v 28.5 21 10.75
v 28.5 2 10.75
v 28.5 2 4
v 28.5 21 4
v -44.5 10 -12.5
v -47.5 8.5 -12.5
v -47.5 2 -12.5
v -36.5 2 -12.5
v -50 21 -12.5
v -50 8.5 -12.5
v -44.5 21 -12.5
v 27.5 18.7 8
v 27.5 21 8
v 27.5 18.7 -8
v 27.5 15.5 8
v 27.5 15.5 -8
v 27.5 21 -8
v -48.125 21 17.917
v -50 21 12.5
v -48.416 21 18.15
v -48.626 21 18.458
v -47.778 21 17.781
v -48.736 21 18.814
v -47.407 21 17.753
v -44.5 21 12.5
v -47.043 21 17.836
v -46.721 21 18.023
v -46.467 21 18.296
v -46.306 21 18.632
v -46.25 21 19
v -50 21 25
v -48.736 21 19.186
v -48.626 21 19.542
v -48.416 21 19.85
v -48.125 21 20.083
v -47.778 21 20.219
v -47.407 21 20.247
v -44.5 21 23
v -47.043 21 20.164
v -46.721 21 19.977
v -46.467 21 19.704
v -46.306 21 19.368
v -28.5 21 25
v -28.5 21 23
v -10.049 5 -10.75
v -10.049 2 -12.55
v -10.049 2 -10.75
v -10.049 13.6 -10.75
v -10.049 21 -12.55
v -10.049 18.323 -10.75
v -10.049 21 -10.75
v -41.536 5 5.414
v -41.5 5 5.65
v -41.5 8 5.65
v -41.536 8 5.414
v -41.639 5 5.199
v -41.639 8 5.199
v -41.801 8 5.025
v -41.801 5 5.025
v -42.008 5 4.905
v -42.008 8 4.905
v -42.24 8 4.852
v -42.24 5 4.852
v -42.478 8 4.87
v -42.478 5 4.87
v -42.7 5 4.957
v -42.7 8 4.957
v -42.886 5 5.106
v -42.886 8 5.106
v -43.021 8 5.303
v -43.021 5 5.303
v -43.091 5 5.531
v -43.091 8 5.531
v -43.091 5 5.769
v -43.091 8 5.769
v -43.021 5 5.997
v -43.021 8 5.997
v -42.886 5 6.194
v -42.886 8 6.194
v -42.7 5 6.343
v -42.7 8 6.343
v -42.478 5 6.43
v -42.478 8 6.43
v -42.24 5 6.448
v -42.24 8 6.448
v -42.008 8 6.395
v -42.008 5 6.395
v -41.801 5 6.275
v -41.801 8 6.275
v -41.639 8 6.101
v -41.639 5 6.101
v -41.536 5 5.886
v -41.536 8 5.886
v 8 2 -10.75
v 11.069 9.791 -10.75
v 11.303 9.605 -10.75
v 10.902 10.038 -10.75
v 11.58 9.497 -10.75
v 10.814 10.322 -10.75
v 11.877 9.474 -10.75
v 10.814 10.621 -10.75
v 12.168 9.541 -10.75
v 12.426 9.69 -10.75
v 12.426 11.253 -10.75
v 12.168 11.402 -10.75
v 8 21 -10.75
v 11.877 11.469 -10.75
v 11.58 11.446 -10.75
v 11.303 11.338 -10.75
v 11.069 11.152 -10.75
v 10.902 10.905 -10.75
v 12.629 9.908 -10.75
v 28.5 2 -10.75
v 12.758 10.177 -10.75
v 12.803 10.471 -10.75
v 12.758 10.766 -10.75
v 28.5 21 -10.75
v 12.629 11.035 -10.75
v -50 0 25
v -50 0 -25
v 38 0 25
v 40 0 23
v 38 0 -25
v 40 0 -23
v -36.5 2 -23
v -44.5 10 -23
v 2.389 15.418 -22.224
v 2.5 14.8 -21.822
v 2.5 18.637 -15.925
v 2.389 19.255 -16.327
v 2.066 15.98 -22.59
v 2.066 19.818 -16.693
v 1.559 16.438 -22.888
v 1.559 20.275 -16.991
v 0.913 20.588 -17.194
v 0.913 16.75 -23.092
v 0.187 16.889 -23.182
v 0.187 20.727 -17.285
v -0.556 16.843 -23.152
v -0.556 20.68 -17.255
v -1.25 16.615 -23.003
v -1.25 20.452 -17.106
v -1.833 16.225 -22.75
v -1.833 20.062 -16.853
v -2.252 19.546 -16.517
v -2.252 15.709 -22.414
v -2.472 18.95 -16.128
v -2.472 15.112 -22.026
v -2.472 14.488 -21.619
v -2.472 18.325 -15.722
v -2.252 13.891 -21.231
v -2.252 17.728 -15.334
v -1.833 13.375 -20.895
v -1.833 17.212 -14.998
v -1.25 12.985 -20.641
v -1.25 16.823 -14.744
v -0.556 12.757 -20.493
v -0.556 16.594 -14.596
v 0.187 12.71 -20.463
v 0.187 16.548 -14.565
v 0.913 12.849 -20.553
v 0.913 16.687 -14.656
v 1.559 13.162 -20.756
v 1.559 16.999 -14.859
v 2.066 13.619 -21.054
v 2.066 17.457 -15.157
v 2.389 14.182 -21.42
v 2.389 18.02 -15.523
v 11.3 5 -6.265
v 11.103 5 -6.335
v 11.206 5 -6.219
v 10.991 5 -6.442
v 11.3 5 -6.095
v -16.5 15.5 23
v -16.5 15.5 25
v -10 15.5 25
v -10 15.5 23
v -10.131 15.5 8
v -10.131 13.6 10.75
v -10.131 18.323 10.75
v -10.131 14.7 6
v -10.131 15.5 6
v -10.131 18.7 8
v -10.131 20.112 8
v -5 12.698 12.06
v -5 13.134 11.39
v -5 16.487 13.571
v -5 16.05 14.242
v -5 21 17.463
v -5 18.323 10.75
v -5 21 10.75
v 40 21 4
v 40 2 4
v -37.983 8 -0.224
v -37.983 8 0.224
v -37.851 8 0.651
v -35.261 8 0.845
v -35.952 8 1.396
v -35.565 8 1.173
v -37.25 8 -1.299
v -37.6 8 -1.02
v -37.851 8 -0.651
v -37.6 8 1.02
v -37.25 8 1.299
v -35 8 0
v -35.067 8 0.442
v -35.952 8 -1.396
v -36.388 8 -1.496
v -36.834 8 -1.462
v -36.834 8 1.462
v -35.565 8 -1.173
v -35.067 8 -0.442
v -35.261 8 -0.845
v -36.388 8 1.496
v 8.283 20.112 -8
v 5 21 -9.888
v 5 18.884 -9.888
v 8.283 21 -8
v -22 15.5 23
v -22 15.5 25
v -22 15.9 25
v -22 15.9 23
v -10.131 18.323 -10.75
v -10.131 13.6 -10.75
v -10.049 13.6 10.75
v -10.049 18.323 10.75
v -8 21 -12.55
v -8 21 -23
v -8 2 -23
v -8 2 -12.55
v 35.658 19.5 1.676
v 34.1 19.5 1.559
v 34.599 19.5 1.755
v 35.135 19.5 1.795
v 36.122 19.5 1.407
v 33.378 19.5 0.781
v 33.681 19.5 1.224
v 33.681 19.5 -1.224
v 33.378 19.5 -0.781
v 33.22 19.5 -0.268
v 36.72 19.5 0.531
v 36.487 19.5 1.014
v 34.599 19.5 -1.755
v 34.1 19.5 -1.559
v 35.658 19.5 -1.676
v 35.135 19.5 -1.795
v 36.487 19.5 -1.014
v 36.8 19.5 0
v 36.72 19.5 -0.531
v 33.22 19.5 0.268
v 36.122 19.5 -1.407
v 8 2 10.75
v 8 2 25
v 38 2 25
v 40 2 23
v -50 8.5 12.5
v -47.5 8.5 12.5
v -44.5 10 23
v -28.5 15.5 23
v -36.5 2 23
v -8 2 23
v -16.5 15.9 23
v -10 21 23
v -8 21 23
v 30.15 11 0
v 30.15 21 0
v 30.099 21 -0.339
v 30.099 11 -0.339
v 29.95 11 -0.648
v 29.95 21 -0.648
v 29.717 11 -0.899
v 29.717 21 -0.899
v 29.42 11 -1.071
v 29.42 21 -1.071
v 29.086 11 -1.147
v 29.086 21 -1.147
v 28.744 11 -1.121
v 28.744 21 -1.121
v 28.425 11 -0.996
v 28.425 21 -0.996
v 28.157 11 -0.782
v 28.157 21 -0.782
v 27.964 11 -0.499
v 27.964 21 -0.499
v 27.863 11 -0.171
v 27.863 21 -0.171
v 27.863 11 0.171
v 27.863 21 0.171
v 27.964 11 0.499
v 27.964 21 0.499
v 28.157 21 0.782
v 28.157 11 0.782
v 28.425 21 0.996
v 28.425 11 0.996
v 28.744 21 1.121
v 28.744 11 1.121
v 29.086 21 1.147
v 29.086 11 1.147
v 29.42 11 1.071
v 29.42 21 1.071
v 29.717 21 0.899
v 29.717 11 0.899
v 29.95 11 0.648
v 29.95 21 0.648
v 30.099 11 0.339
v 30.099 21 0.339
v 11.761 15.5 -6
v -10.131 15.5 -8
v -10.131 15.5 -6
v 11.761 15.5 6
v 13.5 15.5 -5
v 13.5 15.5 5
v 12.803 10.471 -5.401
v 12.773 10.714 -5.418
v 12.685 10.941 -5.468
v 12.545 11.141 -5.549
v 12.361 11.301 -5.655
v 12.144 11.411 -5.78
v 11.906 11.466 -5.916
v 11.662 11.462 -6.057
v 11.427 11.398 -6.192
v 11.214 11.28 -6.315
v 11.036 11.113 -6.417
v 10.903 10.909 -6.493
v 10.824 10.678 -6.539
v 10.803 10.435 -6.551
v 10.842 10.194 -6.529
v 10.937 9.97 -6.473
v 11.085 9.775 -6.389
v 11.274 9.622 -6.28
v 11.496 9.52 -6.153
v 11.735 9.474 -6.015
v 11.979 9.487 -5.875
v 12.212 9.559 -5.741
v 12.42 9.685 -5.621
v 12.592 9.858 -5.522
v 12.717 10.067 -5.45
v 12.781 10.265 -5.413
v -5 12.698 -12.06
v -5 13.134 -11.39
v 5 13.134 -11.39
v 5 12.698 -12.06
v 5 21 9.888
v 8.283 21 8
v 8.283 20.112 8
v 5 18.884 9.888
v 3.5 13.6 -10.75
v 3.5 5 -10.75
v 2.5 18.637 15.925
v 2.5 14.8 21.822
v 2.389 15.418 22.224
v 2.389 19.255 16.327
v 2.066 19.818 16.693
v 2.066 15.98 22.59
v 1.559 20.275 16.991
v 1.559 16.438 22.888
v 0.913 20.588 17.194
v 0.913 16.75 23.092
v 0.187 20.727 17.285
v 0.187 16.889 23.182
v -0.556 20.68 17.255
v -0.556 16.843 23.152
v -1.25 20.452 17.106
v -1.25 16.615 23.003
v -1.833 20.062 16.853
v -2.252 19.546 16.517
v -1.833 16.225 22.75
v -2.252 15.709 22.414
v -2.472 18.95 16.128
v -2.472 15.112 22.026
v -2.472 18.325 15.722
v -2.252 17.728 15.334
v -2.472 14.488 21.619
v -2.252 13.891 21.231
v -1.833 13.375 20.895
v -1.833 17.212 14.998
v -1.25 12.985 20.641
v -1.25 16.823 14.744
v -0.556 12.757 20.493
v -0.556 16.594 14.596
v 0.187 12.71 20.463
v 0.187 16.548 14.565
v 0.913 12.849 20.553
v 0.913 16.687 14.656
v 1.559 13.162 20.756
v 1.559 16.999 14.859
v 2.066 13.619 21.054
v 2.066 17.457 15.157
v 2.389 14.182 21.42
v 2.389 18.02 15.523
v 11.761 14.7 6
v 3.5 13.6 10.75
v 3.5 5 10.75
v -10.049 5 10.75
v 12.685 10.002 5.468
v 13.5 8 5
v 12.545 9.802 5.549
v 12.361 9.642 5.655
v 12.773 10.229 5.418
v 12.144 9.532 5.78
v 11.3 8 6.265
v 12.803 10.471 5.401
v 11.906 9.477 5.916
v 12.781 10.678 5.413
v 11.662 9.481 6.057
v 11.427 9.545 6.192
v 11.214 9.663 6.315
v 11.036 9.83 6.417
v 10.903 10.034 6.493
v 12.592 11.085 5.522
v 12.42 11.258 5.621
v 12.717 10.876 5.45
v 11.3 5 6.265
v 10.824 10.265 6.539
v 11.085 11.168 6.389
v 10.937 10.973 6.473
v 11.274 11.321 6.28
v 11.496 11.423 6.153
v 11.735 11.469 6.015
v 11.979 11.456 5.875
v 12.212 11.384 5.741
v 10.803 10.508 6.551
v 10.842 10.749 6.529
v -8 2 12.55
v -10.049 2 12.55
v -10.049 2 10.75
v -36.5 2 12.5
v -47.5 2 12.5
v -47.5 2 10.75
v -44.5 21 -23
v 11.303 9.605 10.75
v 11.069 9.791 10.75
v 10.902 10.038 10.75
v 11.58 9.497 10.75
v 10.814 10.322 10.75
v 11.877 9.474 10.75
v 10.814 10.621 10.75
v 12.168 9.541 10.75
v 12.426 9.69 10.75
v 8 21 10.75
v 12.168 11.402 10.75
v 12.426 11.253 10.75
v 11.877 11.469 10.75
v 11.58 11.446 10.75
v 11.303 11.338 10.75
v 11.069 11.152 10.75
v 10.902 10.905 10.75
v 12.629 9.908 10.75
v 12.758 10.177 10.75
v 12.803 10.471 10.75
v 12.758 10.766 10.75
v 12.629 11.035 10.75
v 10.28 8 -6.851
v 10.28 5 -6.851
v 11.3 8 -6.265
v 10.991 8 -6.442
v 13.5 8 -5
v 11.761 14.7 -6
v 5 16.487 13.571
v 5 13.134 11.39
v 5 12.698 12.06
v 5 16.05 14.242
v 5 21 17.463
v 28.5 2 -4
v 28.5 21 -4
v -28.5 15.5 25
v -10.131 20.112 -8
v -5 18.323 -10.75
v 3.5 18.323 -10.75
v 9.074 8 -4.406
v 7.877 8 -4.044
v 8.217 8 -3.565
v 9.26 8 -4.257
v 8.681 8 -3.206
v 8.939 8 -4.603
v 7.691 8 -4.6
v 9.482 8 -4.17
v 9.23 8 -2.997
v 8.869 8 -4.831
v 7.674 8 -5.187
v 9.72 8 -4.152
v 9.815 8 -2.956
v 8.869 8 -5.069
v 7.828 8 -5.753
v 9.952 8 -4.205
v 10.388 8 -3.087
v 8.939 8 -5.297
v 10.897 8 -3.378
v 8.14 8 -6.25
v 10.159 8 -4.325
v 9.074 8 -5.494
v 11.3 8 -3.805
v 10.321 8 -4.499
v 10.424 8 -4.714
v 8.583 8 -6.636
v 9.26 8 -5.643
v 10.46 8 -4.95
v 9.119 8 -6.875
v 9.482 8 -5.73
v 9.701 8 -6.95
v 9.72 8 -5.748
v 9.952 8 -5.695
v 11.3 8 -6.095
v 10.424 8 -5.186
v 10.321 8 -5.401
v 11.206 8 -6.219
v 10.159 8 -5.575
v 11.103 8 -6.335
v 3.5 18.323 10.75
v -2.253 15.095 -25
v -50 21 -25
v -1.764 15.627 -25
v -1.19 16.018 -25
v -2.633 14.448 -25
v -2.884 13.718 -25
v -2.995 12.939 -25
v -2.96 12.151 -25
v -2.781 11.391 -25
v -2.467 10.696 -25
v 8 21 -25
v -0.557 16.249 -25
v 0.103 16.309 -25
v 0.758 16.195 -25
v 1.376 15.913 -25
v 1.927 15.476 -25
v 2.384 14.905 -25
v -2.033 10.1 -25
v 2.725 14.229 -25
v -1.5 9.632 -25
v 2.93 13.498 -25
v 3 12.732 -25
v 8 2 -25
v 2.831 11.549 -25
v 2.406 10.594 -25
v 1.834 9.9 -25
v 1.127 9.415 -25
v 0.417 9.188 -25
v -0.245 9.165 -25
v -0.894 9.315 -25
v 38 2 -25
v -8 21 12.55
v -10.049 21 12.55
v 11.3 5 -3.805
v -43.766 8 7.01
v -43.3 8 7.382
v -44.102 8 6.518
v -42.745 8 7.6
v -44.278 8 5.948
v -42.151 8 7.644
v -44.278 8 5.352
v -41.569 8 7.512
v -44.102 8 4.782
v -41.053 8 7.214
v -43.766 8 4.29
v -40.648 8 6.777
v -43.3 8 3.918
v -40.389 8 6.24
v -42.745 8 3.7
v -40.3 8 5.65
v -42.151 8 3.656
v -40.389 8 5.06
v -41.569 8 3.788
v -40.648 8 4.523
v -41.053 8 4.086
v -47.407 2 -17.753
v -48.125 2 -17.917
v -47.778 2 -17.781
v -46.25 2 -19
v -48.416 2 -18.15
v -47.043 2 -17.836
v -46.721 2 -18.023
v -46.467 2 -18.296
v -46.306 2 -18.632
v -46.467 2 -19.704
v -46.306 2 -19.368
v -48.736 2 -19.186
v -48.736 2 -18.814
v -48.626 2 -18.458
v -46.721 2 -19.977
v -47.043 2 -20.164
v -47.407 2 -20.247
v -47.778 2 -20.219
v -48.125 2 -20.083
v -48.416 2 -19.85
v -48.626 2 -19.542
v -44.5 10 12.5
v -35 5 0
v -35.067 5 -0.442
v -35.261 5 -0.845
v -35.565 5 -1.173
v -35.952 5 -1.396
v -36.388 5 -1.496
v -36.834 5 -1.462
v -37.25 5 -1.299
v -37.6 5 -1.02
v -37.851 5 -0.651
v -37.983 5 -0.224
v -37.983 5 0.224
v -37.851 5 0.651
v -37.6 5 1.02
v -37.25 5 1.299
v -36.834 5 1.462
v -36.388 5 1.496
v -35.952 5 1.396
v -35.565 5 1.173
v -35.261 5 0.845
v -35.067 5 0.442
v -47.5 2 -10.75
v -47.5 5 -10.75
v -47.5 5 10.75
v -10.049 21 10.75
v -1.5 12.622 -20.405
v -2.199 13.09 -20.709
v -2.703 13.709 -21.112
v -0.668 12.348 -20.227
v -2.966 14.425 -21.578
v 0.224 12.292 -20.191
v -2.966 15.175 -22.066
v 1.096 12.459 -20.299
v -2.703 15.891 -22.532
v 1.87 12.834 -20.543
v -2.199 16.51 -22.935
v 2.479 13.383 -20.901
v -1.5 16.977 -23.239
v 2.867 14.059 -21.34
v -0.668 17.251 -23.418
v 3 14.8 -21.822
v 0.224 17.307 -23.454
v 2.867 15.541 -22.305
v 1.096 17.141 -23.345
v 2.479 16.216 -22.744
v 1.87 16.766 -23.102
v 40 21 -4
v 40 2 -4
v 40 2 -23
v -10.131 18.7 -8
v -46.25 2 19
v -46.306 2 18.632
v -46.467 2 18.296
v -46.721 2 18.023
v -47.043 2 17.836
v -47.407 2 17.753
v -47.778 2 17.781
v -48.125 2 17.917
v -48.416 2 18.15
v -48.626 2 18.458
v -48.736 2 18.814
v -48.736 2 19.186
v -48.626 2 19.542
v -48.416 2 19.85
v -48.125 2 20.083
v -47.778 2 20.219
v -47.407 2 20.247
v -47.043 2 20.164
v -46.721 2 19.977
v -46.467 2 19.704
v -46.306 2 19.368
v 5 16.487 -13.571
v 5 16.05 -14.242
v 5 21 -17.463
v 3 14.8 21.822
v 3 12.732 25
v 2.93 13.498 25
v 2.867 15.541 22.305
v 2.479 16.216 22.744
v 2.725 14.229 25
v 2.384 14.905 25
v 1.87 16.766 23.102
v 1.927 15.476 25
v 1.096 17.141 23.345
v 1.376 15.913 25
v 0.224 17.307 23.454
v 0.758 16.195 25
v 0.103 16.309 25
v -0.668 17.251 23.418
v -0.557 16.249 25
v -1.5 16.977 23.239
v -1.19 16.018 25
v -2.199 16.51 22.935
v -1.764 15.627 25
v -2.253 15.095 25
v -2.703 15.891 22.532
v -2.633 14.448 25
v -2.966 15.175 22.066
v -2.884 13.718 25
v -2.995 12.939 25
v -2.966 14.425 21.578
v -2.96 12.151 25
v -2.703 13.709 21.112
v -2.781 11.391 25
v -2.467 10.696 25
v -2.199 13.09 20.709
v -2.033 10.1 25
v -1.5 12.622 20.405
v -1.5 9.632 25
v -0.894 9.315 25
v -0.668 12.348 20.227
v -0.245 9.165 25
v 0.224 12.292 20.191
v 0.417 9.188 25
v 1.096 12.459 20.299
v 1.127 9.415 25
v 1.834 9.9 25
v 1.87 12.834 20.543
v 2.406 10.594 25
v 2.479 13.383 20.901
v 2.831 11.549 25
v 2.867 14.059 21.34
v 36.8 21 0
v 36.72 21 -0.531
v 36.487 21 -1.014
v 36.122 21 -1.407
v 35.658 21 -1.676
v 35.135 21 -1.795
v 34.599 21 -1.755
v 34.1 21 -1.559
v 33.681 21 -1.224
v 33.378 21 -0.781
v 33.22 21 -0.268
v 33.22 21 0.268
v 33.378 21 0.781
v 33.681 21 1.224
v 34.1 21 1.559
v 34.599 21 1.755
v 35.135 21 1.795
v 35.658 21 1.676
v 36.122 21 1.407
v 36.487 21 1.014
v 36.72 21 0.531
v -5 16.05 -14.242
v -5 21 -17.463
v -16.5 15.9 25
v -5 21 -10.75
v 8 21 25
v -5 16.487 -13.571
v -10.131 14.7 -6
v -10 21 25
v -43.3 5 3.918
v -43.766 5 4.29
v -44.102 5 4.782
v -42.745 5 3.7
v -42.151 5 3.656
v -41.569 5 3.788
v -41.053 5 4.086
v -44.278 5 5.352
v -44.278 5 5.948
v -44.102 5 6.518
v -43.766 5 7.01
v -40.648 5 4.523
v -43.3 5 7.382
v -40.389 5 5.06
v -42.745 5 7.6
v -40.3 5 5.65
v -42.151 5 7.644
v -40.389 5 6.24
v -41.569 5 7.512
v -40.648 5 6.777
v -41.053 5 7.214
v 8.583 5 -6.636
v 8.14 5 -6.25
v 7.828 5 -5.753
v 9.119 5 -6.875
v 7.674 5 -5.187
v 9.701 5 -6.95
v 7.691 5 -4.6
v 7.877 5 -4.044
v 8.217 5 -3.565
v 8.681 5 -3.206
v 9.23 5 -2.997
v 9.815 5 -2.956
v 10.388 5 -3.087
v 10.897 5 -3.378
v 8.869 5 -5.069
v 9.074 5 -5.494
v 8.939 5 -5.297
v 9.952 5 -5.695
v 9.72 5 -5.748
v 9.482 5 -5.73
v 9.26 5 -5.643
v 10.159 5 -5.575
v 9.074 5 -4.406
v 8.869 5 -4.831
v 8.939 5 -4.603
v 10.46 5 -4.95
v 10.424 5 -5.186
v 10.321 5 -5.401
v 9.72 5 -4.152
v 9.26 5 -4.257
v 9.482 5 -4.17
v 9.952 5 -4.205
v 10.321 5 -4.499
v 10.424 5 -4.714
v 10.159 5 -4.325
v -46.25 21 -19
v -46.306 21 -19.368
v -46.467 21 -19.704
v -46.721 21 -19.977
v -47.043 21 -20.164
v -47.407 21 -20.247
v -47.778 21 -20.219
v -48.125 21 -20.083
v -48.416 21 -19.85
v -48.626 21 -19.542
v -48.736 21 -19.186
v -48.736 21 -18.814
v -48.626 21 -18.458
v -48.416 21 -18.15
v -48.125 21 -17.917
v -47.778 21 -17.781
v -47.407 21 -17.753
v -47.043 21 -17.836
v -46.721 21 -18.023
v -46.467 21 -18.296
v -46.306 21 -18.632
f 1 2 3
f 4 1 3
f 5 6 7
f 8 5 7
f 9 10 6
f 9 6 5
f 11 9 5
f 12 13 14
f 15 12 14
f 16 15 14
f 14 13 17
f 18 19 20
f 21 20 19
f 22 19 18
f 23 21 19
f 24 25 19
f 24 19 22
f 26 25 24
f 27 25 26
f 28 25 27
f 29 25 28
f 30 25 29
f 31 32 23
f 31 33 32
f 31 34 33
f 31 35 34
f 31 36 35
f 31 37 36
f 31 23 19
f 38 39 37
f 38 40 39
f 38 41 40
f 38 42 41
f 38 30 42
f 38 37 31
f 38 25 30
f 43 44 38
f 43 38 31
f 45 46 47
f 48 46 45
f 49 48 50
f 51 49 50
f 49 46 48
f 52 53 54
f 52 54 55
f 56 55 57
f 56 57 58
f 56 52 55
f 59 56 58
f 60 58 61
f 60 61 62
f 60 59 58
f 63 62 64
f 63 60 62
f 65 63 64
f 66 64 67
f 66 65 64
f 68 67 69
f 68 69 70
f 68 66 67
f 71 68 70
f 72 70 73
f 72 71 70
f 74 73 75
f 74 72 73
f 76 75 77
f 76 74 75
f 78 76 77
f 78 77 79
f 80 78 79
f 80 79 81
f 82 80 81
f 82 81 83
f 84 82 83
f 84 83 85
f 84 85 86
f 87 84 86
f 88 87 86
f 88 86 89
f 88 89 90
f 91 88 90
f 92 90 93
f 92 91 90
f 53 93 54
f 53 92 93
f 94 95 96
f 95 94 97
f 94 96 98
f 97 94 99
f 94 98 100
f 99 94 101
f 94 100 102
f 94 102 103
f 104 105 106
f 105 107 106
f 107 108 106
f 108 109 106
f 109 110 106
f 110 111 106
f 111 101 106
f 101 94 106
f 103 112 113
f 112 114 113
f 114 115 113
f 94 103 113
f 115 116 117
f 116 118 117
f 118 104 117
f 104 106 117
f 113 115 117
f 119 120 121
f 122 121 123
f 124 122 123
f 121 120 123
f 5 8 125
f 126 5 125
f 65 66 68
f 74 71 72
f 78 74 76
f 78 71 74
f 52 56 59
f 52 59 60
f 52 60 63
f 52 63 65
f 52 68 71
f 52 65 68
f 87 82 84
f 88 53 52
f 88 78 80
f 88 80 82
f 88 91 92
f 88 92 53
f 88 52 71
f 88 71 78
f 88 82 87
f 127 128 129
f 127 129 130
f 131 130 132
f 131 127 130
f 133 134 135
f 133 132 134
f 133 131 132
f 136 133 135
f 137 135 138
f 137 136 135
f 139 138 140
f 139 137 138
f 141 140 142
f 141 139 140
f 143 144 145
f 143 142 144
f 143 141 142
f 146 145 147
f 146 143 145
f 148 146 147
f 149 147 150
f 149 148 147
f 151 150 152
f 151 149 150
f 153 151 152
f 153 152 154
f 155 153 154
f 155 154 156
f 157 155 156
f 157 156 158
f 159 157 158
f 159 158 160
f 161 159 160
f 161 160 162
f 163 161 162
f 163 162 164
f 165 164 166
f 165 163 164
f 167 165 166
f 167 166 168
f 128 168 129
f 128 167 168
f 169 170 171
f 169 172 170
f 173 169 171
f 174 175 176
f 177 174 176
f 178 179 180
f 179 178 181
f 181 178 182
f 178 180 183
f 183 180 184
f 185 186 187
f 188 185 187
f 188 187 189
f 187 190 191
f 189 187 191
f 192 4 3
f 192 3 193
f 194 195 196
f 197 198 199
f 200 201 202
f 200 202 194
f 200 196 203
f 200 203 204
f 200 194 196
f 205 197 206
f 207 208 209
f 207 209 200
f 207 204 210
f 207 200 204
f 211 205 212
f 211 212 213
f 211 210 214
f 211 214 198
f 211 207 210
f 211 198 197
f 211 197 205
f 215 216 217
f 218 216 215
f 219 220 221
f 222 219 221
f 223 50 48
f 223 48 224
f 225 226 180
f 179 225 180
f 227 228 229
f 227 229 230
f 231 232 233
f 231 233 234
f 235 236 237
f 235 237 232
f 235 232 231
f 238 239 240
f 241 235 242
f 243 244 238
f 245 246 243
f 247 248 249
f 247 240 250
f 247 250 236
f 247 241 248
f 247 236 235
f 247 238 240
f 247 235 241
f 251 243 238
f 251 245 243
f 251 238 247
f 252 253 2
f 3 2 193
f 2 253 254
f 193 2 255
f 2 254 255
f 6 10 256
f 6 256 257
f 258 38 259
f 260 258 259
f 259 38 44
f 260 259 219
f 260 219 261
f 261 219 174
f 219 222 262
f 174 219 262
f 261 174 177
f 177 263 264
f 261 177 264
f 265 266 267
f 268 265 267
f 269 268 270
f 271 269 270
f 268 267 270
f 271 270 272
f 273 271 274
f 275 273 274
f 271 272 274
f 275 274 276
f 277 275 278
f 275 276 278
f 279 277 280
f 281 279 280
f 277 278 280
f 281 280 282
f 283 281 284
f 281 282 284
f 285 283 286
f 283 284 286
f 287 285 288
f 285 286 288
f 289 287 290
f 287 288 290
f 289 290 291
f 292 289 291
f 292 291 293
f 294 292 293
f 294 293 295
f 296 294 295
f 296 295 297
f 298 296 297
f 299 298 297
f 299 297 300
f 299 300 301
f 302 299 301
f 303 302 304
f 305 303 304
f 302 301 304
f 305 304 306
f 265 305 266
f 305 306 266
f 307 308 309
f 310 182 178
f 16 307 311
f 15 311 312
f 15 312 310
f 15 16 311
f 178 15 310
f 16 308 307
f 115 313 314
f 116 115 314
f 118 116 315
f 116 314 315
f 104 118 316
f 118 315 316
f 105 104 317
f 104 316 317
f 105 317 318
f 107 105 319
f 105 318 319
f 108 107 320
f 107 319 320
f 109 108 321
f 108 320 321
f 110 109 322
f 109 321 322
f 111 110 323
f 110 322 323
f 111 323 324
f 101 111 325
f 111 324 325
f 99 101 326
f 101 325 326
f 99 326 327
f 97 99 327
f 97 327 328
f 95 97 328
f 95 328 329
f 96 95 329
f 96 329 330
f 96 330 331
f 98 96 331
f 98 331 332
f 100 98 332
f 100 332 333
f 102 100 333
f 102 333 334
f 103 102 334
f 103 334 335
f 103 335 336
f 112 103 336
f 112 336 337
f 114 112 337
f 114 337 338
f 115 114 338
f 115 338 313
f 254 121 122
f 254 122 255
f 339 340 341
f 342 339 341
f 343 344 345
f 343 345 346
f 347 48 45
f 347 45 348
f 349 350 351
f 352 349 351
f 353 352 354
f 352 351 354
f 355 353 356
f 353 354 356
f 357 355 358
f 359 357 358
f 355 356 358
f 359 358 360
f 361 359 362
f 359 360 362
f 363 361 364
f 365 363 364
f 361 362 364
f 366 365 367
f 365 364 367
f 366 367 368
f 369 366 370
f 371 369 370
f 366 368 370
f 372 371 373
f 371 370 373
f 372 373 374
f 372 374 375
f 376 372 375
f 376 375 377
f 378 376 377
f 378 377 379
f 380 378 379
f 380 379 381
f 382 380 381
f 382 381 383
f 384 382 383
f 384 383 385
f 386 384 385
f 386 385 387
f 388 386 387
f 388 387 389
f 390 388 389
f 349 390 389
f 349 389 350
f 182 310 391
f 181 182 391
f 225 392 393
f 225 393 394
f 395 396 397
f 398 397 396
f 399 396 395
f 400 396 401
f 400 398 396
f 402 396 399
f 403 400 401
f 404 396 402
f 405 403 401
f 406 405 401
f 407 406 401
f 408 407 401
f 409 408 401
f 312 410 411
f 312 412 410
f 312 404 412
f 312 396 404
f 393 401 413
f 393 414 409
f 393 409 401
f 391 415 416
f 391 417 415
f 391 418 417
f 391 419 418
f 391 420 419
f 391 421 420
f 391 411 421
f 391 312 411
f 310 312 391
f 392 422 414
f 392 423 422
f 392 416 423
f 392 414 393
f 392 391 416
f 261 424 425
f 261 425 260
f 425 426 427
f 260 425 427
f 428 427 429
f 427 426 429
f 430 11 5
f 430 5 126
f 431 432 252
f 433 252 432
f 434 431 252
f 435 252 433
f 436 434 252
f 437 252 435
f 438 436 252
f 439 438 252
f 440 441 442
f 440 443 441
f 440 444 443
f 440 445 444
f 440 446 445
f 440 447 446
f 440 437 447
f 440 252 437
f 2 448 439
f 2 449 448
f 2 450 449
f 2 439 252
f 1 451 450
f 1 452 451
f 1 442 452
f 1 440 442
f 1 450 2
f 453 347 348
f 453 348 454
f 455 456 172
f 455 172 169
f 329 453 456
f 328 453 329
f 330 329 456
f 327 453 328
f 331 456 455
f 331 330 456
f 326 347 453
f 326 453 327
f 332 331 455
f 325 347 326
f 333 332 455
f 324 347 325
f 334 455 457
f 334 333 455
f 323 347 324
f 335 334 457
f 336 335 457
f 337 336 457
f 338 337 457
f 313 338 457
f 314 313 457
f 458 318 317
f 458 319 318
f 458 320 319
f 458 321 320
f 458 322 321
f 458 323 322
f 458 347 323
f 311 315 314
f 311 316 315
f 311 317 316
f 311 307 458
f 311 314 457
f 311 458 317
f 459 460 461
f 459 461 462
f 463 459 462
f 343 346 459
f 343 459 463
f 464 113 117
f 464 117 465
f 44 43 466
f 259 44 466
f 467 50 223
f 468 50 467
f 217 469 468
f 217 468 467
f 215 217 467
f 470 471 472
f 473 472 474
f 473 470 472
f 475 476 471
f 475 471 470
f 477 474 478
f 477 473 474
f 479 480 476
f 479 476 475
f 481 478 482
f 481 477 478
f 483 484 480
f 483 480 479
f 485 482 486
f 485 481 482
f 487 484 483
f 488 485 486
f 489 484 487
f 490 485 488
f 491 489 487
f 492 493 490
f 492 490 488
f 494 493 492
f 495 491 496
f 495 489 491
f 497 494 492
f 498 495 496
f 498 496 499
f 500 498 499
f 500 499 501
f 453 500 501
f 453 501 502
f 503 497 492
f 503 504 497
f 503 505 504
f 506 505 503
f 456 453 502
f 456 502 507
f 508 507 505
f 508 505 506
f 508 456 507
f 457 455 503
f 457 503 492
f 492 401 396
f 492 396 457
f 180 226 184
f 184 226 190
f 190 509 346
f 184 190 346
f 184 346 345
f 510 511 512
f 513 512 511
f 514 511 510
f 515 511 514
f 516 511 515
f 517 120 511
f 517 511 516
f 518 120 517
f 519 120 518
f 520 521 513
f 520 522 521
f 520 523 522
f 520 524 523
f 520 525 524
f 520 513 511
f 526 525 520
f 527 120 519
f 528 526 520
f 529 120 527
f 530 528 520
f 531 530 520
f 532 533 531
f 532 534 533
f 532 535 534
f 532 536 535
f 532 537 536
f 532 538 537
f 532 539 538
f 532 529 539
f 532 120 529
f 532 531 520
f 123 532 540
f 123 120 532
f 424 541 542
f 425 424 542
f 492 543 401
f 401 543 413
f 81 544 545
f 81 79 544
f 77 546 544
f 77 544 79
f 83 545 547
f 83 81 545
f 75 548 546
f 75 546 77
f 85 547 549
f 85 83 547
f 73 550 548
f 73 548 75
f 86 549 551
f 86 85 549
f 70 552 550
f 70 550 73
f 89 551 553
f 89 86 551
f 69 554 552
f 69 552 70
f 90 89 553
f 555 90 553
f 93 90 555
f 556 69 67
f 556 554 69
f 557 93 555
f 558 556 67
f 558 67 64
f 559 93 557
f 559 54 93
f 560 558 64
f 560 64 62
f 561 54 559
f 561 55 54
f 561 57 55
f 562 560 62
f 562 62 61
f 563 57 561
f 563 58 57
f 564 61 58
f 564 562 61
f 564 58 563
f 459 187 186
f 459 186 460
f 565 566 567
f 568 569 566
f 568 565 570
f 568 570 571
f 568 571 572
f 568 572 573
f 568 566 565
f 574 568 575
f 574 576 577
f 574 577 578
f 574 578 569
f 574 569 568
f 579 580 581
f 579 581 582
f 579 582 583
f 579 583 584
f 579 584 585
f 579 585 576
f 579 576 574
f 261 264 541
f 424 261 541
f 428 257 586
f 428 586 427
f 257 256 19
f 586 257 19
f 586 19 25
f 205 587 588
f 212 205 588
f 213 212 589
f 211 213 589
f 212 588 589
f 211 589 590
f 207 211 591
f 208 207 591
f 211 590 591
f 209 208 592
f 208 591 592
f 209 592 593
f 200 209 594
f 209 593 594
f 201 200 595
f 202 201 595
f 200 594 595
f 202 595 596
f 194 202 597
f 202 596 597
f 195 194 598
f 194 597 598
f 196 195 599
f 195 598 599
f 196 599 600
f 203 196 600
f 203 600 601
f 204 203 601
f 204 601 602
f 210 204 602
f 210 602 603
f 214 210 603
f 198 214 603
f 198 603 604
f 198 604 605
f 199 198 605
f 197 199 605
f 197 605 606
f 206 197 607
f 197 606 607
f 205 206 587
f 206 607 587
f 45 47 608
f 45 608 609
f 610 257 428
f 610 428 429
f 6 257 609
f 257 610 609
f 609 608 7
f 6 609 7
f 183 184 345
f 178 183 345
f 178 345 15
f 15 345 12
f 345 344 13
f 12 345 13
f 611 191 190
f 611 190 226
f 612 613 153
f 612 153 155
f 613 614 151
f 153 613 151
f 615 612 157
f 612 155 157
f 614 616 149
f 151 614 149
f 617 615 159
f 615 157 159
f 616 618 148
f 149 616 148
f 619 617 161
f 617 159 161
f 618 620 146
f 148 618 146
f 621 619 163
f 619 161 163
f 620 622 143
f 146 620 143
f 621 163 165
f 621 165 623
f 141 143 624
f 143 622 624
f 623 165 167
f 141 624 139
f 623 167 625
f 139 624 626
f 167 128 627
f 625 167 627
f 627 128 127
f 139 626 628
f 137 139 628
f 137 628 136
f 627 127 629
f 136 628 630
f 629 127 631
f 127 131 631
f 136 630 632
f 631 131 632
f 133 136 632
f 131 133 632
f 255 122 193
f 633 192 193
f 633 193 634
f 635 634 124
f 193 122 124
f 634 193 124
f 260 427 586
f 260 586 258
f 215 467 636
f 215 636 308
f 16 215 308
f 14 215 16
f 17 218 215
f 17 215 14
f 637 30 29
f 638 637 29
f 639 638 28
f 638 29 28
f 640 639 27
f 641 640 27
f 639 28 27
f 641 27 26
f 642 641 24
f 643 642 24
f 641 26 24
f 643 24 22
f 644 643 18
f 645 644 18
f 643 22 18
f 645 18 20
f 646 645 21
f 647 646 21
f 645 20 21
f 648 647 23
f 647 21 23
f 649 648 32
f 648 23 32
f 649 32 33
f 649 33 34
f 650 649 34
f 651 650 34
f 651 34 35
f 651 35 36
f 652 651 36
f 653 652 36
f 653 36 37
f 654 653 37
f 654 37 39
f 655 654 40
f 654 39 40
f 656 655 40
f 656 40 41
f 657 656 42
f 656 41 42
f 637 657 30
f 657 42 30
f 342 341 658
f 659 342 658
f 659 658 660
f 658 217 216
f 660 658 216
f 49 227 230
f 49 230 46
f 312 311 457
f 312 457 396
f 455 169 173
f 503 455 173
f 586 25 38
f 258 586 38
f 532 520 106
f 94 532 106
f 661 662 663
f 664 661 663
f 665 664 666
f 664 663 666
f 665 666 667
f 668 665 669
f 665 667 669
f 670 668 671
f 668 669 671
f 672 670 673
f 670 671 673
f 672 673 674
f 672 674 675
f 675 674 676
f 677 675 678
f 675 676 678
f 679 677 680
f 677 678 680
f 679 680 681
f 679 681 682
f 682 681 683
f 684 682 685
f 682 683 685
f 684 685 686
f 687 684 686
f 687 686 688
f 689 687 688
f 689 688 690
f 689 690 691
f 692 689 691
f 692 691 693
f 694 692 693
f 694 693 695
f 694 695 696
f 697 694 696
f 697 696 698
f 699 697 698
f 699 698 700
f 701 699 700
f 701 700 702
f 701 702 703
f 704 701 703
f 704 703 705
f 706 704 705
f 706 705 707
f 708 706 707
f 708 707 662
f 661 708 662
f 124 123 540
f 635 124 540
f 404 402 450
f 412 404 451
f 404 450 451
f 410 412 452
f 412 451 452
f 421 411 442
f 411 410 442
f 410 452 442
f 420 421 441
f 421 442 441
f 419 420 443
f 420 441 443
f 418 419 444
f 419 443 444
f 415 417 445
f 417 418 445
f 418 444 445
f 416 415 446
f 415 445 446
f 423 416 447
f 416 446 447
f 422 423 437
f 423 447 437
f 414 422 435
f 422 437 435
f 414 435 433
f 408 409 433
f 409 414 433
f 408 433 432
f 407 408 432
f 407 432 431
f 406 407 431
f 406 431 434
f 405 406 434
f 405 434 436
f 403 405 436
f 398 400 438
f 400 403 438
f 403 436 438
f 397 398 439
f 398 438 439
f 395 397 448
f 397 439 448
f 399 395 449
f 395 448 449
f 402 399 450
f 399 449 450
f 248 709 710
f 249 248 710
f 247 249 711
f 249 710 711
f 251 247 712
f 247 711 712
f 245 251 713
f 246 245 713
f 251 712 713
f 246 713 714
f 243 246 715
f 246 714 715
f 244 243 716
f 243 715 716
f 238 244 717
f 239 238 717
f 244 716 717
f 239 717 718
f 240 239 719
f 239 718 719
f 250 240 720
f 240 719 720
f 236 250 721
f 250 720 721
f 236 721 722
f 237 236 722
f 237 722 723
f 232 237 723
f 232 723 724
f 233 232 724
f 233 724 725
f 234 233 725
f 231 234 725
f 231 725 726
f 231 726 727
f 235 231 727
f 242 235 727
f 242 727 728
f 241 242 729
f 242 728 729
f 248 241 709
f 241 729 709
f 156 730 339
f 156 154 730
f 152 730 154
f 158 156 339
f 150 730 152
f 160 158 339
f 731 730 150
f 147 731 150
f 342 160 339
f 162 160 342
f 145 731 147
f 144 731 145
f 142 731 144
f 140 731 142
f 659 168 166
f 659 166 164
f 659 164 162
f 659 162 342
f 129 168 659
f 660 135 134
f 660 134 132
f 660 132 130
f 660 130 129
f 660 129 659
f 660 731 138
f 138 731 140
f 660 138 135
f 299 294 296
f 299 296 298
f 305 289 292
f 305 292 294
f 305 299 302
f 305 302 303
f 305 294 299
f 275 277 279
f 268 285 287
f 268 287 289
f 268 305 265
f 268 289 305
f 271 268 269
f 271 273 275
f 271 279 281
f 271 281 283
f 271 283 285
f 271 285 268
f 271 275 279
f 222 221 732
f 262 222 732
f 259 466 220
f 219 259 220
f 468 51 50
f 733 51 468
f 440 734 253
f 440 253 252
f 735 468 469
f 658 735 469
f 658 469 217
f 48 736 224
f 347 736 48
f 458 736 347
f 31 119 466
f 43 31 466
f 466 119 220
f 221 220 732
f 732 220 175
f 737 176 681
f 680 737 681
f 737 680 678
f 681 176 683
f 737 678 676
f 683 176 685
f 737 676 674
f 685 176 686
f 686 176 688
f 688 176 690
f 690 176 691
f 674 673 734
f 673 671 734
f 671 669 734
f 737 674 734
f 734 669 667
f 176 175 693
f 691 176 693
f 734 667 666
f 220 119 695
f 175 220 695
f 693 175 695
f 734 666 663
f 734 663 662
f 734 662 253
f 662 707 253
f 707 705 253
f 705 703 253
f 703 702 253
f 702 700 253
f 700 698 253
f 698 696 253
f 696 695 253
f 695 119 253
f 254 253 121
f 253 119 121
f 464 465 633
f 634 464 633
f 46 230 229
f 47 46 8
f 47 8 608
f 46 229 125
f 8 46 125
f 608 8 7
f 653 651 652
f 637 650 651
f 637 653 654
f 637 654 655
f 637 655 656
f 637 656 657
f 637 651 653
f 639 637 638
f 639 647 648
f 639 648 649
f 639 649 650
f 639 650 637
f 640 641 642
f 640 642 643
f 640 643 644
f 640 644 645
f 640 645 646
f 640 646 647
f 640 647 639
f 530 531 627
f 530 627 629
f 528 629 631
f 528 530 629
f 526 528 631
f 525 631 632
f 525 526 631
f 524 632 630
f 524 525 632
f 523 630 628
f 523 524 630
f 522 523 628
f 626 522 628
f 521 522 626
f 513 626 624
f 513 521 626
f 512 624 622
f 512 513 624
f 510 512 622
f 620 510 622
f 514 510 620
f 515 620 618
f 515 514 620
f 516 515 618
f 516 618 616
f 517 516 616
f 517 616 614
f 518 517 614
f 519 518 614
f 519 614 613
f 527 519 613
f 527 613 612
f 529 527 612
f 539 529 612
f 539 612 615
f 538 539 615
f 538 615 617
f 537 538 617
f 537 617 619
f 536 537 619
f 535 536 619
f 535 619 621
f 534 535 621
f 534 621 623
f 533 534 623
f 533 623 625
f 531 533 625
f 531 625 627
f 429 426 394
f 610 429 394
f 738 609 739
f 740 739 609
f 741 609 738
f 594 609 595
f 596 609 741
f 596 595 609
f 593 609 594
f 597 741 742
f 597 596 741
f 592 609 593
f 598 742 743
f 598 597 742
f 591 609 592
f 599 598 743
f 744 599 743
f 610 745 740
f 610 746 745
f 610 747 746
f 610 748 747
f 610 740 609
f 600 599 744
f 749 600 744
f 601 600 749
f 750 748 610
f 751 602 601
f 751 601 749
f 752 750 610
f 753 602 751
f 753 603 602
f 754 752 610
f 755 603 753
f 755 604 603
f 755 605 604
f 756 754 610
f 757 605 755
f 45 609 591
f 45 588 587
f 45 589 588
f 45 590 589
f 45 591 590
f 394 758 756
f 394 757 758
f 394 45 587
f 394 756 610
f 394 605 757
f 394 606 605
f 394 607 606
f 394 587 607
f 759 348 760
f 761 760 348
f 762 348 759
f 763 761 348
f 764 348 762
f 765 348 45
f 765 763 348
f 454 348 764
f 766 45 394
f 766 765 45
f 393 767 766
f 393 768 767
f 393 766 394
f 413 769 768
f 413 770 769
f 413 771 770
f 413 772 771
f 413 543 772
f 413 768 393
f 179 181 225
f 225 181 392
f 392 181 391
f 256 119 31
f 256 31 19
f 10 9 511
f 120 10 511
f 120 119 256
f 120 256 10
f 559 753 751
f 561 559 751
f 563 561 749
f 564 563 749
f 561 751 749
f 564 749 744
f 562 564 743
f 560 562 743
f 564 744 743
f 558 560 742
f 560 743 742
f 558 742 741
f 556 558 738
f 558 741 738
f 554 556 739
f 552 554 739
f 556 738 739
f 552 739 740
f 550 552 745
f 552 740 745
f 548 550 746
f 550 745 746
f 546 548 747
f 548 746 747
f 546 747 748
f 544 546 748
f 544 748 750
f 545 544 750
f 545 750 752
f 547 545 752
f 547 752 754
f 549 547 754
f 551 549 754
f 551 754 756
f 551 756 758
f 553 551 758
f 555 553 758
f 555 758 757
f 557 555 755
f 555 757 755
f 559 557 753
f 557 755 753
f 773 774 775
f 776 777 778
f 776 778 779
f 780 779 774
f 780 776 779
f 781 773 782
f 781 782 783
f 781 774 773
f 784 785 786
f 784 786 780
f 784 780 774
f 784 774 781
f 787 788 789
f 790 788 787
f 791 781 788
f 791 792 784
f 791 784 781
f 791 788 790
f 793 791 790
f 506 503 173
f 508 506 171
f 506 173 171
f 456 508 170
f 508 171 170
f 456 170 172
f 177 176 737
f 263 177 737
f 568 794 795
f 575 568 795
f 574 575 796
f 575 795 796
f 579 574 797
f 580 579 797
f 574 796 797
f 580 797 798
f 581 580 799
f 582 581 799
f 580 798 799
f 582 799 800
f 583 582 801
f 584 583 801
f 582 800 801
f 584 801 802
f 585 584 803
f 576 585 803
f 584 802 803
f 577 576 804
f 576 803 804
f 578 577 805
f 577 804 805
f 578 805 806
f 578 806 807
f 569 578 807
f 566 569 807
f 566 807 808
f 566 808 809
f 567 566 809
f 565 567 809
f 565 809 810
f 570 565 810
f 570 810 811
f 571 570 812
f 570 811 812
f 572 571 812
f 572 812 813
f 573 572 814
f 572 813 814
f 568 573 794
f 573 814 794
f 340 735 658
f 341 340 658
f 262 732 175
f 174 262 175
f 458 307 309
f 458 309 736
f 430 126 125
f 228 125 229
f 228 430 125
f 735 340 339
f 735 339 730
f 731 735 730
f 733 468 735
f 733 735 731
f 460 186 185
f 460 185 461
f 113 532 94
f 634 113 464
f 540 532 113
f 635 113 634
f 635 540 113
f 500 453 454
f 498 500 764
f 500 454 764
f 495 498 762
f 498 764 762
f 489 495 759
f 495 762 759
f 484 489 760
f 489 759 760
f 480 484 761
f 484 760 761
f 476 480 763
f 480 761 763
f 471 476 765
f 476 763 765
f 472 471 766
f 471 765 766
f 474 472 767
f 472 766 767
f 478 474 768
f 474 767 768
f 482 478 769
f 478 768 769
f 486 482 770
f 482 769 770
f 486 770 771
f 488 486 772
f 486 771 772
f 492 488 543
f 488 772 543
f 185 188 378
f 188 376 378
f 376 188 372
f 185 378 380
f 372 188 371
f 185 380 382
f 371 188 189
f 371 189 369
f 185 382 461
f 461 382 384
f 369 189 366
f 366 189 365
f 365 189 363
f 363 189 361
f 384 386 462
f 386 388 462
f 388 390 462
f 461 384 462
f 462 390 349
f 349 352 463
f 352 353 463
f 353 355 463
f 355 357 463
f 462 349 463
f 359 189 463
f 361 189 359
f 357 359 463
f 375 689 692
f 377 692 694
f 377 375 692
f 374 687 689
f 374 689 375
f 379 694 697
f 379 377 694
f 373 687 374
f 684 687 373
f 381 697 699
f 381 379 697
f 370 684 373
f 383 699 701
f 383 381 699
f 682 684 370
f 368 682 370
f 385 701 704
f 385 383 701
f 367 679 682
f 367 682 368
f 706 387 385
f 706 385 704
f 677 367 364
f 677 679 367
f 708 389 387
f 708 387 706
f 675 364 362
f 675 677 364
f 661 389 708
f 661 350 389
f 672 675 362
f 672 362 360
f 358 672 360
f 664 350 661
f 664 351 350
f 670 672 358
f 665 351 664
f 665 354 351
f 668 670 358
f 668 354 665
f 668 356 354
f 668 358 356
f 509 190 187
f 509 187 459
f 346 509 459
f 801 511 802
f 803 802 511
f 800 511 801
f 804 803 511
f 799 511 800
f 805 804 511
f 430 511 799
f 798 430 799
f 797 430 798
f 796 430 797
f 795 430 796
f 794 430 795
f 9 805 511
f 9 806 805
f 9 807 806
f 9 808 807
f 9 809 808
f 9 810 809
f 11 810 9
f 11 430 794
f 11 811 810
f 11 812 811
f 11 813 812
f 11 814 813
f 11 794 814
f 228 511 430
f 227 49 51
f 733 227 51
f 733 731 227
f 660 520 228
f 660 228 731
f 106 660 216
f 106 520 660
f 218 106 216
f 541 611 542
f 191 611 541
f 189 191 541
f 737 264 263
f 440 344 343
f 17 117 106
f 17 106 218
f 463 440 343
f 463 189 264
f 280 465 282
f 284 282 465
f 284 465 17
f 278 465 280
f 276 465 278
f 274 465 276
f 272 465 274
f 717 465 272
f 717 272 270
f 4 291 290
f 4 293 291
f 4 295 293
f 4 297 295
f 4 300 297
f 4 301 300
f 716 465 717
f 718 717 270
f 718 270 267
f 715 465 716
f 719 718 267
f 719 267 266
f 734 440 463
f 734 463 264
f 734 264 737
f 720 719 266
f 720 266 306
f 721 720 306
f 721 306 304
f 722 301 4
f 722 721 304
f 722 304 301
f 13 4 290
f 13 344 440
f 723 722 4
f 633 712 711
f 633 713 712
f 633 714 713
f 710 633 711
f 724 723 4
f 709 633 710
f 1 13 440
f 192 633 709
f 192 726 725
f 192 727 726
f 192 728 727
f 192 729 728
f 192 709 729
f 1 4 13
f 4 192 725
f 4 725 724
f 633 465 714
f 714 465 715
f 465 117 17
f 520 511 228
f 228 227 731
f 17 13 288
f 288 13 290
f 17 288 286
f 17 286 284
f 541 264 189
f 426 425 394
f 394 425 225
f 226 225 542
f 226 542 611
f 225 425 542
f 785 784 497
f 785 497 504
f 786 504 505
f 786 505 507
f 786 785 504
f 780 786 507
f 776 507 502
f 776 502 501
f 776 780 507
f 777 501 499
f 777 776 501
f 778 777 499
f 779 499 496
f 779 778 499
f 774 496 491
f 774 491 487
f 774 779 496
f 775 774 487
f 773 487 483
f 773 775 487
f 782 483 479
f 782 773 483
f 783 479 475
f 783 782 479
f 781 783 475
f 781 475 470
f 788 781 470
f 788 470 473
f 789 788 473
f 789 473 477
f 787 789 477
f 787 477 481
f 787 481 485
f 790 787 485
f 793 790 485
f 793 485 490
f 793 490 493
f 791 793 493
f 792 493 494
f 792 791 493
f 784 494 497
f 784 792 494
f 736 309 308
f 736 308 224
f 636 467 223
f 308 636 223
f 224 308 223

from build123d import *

# Parameters (mm, degrees)
SKETCH1_W           = 90
SKETCH1_H           = 50
BOSS_EXTRUDE1_DEPTH = 21
CUT_EXTRUDE1_DEPTH  = 16
SKETCH4_R           = 2.5
CUT_EXTRUDE2_DEPTH  = 63.626624678
SKETCH5_W           = 10
SKETCH5_H           = 6.2
CUT_EXTRUDE3_DEPTH  = 19
SKETCH6_R           = 3
CUT_EXTRUDE4_DEPTH  = 20
SKETCH11_R          = 1.5
BOSS_EXTRUDE3_DEPTH = 3
BOSS_EXTRUDE2_DEPTH = 23.630686795
CUT_EXTRUDE6_DEPTH  = 19
SKETCH17_W          = 16
SKETCH17_H          = 3.2
CUT_EXTRUDE10_DEPTH = 37.549476
SKETCH15_R          = 1.8
CUT_EXTRUDE8_DEPTH  = 1.5
SKETCH16_R          = 1.25
CUT_EXTRUDE9_DEPTH  = 19
CUT_EXTRUDE11_REACH = 23
SKETCH19_R          = 4
CHAMFER1_SIZE       = 8
CHAMFER2_SIZE       = 2
CUT_EXTRUDE12_REACH = 52
SKETCH21_W          = 21.5
SKETCH21_H          = 3
BOSS_EXTRUDE4_DEPTH = 5.5
CUT_EXTRUDE13_REACH = 23
SKETCH23_W          = 37.630686795
SKETCH23_H          = 16
SKETCH25_R          = 1.15
CUT_EXTRUDE14_DEPTH = 10
SKETCH26_R          = 1
CUT_EXTRUDE15_DEPTH = 36.75
SKETCH27_W          = 2.5
SKETCH27_H          = 25
BOSS_EXTRUDE6_DEPTH = 6.5
SKETCH28_W          = 10
SKETCH28_H          = 0.8
CUT_EXTRUDE16_DEPTH = 4
SKETCH22_R          = 2
SKETCH22_R_2        = 0.8
BOSS_EXTRUDE7_DEPTH = 3


with BuildPart() as part:
    # Sketch1 → Boss-Extrude1 (new body)
    with BuildSketch(Plane(origin=(0, 0, 0), x_dir=(1, 0, 0), z_dir=(0, 1, 0))):
        with Locations((-5, 0)):
            Rectangle(SKETCH1_W, SKETCH1_H)
    extrude(amount=BOSS_EXTRUDE1_DEPTH)

    # Sketch2 → Cut-Extrude1 (cut)
    with BuildSketch(Plane(origin=(0, 21, 0), x_dir=(1, 0, 0), z_dir=(0, 1, 0))):
        Polygon((-44.5, 10.75), (3.5, 10.75), (13.5, 5), (13.5, -5), (3.5, -10.75), (-44.5, -10.75), align=None)
    extrude(amount=-CUT_EXTRUDE1_DEPTH, mode=Mode.SUBTRACT)

    # Sketch4 → Cut-Extrude2 (cut, through all)
    with BuildSketch(Plane(origin=(0, 3.891653574, -38.585684316), x_dir=(1, 0, 0), z_dir=(0, 0.545410535, 0.838169045))):
        Circle(SKETCH4_R)
    cut_extrude2 = extrude(amount=CUT_EXTRUDE2_DEPTH, mode=Mode.SUBTRACT)

    # Sketch5 → Cut-Extrude3 (cut)
    with BuildSketch(Plane(origin=(0, 29, 0), x_dir=(1, 0, 0), z_dir=(0, 0.545410535, 0.838169045))):
        with Locations((0, 0.013708289)):
            Rectangle(SKETCH5_W, SKETCH5_H)
    cut_extrude3 = extrude(amount=-CUT_EXTRUDE3_DEPTH, mode=Mode.SUBTRACT)

    # Sketch6 → Cut-Extrude4 (cut)
    with BuildSketch(Plane(origin=(0, 3.891653574, -38.585684316), x_dir=(1, 0, 0), z_dir=(0, 0.545410535, 0.838169045))):
        Circle(SKETCH6_R)
    cut_extrude4 = extrude(amount=CUT_EXTRUDE4_DEPTH, mode=Mode.SUBTRACT)

    # Sketch11 → Boss-Extrude3 (add)
    with BuildSketch(Plane(origin=(0, 5, 0), x_dir=(1, 0, 0), z_dir=(0, 1, 0))):
        with Locations((-36.5, 0)):
            Circle(SKETCH11_R)
        Polygon((11.3, 6.265), (11.3, -6.265), (13.5, -5), (13.5, 5), align=None)
    extrude(amount=BOSS_EXTRUDE3_DEPTH)

    # Sketch9 → Boss-Extrude2 (add)
    with BuildSketch(Plane.ZY.offset(-13.5)):
        Polygon((-8, 18.7), (-8, 15.5), (-6, 15.5), (-6, 14.7), (-10.75, 13.6), (-11.152370245, 13.6), (-11.152370245, 14.662668332), (-11.152370245, 18.060784345), (-6.635479906, 21), (0, 21), (0, 18.7), align=None)
    boss_extrude2 = extrude(amount=BOSS_EXTRUDE2_DEPTH)

    # Mirror1: Cut-Extrude2, Cut-Extrude3, Cut-Extrude4, Boss-Extrude2 across plane
    add(cut_extrude2.mirror(Plane.XY), mode=Mode.SUBTRACT)
    add(cut_extrude3.mirror(Plane.XY), mode=Mode.SUBTRACT)
    add(cut_extrude4.mirror(Plane.XY), mode=Mode.SUBTRACT)
    add(boss_extrude2.mirror(Plane.XY))

    # Sketch10 → Cut-Extrude6 (cut)
    with BuildSketch(Plane(origin=(0, 21, 0), x_dir=(1, 0, 0), z_dir=(0, 1, 0))):
        Polygon((-44.5, 12.5), (-44.5, 23), (-8, 23), (-8, 12.55), (-10.049475977, 12.55), (-10.049475977, 10.75), (-44.5, 10.75), (-44.5, 0), (-50, 0), (-50, 12.5), align=None)
        Polygon((8, 25), (8, 10.75), (28.5, 10.75), (28.5, 4), (46.328078386, 4), (46.328078386, 30.717572765), (8, 31.044325351), align=None)
    cut_extrude6 = extrude(amount=-CUT_EXTRUDE6_DEPTH, mode=Mode.SUBTRACT)

    # Mirror2: Cut-Extrude6 across plane
    add(cut_extrude6.mirror(Plane.XY), mode=Mode.SUBTRACT)

    # Sketch17 → Cut-Extrude10 (cut)
    with BuildSketch(Plane.ZY.offset(10.049475977)):
        with Locations((0, 17.1)):
            Rectangle(SKETCH17_W, SKETCH17_H)
    extrude(amount=-CUT_EXTRUDE10_DEPTH, mode=Mode.SUBTRACT)

    # Sketch15 → Cut-Extrude8 (cut)
    with BuildSketch(Plane(origin=(0, 21, 0), x_dir=(1, 0, 0), z_dir=(0, 1, 0))):
        with Locations((35, 0)):
            Circle(SKETCH15_R)
    extrude(amount=-CUT_EXTRUDE8_DEPTH, mode=Mode.SUBTRACT)

    # Sketch16 → Cut-Extrude9 (cut)
    with BuildSketch(Plane(origin=(0, 21, 0), x_dir=(1, 0, 0), z_dir=(0, 1, 0))):
        with Locations((-47.5, 19)):
            Circle(SKETCH16_R)
        with Locations((-47.5, -19)):
            Circle(SKETCH16_R)
    extrude(amount=-CUT_EXTRUDE9_DEPTH, mode=Mode.SUBTRACT)

    # Sketch19 → Cut-Extrude11 (cut, up to next)
    with BuildSketch(Plane(origin=(0, 21, 0), x_dir=(1, 0, 0), z_dir=(0, 1, 0)), mode=Mode.PRIVATE) as cut_extrude11_sk1:
        Circle(SKETCH19_R)
    cut_extrude11_tool1 = extrude(cut_extrude11_sk1.sketch, amount=-CUT_EXTRUDE11_REACH, mode=Mode.PRIVATE) & part.part
    add(cut_extrude11_tool1.solids().sort_by_distance((0, 21, 0))[0], mode=Mode.SUBTRACT)

    # Chamfer1
    chamfer1_edges = [part.edges().sort_by_distance(p)[0] for p in [
        (-44.5, 2, -17.75),
        (-44.5, 2, 17.75),
    ]]
    chamfer(chamfer1_edges, length=CHAMFER1_SIZE)

    # Chamfer2
    chamfer2_edges = [part.edges().sort_by_distance(p)[0] for p in [
        (40, 1, -25),
        (40, 1, 25),
    ]]
    chamfer(chamfer2_edges, length=CHAMFER2_SIZE)

    # Sketch20 → Cut-Extrude12 (cut, up to next)
    with BuildSketch(Plane.XY.offset(25), mode=Mode.PRIVATE) as cut_extrude12_sk1:
        Polygon((-28.5, 15.5), (-22, 15.5), (-22, 15.9), (-16.5, 15.9), (-16.5, 15.5), (-10, 15.5), (-10, 21), (-28.5, 21), (-28.5, 15.8), align=None)
    cut_extrude12_tool1 = extrude(cut_extrude12_sk1.sketch, amount=-CUT_EXTRUDE12_REACH, mode=Mode.PRIVATE) & part.part
    add(cut_extrude12_tool1.solids().sort_by_distance((-19.25, 18.306354, 25))[0], mode=Mode.SUBTRACT)

    # Sketch21 → Boss-Extrude4 (add)
    with BuildSketch(Plane.ZY.offset(44.5)):
        with Locations((0, 3.5)):
            Rectangle(SKETCH21_W, SKETCH21_H)
    extrude(amount=BOSS_EXTRUDE4_DEPTH)

    # Sketch23 → Cut-Extrude13 (cut, up to next)
    with BuildSketch(Plane(origin=(0, 21, 0), x_dir=(1, 0, 0), z_dir=(0, 1, 0)), mode=Mode.PRIVATE) as cut_extrude13_sk1:
        with Locations((8.684656602, 0)):
            Rectangle(SKETCH23_W, SKETCH23_H)
    cut_extrude13_tool1 = extrude(cut_extrude13_sk1.sketch, amount=-CUT_EXTRUDE13_REACH, mode=Mode.PRIVATE) & part.part
    add(cut_extrude13_tool1.solids().sort_by_distance((8.684657, 21, 0))[0], mode=Mode.SUBTRACT)

    # Sketch25 → Cut-Extrude14 (cut)
    with BuildSketch(Plane(origin=(0, 21, 0), x_dir=(1, 0, 0), z_dir=(0, 1, 0))):
        with Locations((29, 0)):
            Circle(SKETCH25_R)
    extrude(amount=-CUT_EXTRUDE14_DEPTH, mode=Mode.SUBTRACT)

    # Sketch26 → Cut-Extrude15 (cut, through all)
    with BuildSketch(Plane.XY.offset(10.75)):
        with Locations((11.80251356, 10.471486046)):
            Circle(SKETCH26_R)
    extrude(amount=-CUT_EXTRUDE15_DEPTH, mode=Mode.SUBTRACT)

    # Sketch27 → Boss-Extrude6 (add)
    with BuildSketch(Plane(origin=(0, 2, 0), x_dir=(1, 0, 0), z_dir=(0, 1, 0))):
        with Locations((-48.75, 0)):
            Rectangle(SKETCH27_W, SKETCH27_H)
    extrude(amount=BOSS_EXTRUDE6_DEPTH)

    # Sketch28 → Cut-Extrude16 (cut)
    with BuildSketch(Plane(origin=(0, 17.786458912, 11.573944585), x_dir=(1, 0, 0), z_dir=(0, 0.838169045, 0.545410535))):
        with Locations((0, -2.783094473)):
            Rectangle(SKETCH28_W, SKETCH28_H)
    cut_extrude16 = extrude(amount=-CUT_EXTRUDE16_DEPTH, mode=Mode.SUBTRACT)

    # Mirror3: Cut-Extrude16 across plane
    add(cut_extrude16.mirror(Plane.XY), mode=Mode.SUBTRACT)

    # Sketch22 → Boss-Extrude7 (add)
    with BuildSketch(Plane(origin=(0, 5, 0), x_dir=(1, 0, 0), z_dir=(0, 1, 0))):
        with Locations((-42.3, -5.65)):
            Circle(SKETCH22_R)
        with Locations((-42.3, -5.65)):
            Circle(SKETCH22_R_2, mode=Mode.SUBTRACT)
        with Locations((9.66, 4.95)):
            Circle(SKETCH22_R)
        with Locations((9.66, 4.95)):
            Circle(SKETCH22_R_2, mode=Mode.SUBTRACT)
    extrude(amount=BOSS_EXTRUDE7_DEPTH)


solid = part.part
